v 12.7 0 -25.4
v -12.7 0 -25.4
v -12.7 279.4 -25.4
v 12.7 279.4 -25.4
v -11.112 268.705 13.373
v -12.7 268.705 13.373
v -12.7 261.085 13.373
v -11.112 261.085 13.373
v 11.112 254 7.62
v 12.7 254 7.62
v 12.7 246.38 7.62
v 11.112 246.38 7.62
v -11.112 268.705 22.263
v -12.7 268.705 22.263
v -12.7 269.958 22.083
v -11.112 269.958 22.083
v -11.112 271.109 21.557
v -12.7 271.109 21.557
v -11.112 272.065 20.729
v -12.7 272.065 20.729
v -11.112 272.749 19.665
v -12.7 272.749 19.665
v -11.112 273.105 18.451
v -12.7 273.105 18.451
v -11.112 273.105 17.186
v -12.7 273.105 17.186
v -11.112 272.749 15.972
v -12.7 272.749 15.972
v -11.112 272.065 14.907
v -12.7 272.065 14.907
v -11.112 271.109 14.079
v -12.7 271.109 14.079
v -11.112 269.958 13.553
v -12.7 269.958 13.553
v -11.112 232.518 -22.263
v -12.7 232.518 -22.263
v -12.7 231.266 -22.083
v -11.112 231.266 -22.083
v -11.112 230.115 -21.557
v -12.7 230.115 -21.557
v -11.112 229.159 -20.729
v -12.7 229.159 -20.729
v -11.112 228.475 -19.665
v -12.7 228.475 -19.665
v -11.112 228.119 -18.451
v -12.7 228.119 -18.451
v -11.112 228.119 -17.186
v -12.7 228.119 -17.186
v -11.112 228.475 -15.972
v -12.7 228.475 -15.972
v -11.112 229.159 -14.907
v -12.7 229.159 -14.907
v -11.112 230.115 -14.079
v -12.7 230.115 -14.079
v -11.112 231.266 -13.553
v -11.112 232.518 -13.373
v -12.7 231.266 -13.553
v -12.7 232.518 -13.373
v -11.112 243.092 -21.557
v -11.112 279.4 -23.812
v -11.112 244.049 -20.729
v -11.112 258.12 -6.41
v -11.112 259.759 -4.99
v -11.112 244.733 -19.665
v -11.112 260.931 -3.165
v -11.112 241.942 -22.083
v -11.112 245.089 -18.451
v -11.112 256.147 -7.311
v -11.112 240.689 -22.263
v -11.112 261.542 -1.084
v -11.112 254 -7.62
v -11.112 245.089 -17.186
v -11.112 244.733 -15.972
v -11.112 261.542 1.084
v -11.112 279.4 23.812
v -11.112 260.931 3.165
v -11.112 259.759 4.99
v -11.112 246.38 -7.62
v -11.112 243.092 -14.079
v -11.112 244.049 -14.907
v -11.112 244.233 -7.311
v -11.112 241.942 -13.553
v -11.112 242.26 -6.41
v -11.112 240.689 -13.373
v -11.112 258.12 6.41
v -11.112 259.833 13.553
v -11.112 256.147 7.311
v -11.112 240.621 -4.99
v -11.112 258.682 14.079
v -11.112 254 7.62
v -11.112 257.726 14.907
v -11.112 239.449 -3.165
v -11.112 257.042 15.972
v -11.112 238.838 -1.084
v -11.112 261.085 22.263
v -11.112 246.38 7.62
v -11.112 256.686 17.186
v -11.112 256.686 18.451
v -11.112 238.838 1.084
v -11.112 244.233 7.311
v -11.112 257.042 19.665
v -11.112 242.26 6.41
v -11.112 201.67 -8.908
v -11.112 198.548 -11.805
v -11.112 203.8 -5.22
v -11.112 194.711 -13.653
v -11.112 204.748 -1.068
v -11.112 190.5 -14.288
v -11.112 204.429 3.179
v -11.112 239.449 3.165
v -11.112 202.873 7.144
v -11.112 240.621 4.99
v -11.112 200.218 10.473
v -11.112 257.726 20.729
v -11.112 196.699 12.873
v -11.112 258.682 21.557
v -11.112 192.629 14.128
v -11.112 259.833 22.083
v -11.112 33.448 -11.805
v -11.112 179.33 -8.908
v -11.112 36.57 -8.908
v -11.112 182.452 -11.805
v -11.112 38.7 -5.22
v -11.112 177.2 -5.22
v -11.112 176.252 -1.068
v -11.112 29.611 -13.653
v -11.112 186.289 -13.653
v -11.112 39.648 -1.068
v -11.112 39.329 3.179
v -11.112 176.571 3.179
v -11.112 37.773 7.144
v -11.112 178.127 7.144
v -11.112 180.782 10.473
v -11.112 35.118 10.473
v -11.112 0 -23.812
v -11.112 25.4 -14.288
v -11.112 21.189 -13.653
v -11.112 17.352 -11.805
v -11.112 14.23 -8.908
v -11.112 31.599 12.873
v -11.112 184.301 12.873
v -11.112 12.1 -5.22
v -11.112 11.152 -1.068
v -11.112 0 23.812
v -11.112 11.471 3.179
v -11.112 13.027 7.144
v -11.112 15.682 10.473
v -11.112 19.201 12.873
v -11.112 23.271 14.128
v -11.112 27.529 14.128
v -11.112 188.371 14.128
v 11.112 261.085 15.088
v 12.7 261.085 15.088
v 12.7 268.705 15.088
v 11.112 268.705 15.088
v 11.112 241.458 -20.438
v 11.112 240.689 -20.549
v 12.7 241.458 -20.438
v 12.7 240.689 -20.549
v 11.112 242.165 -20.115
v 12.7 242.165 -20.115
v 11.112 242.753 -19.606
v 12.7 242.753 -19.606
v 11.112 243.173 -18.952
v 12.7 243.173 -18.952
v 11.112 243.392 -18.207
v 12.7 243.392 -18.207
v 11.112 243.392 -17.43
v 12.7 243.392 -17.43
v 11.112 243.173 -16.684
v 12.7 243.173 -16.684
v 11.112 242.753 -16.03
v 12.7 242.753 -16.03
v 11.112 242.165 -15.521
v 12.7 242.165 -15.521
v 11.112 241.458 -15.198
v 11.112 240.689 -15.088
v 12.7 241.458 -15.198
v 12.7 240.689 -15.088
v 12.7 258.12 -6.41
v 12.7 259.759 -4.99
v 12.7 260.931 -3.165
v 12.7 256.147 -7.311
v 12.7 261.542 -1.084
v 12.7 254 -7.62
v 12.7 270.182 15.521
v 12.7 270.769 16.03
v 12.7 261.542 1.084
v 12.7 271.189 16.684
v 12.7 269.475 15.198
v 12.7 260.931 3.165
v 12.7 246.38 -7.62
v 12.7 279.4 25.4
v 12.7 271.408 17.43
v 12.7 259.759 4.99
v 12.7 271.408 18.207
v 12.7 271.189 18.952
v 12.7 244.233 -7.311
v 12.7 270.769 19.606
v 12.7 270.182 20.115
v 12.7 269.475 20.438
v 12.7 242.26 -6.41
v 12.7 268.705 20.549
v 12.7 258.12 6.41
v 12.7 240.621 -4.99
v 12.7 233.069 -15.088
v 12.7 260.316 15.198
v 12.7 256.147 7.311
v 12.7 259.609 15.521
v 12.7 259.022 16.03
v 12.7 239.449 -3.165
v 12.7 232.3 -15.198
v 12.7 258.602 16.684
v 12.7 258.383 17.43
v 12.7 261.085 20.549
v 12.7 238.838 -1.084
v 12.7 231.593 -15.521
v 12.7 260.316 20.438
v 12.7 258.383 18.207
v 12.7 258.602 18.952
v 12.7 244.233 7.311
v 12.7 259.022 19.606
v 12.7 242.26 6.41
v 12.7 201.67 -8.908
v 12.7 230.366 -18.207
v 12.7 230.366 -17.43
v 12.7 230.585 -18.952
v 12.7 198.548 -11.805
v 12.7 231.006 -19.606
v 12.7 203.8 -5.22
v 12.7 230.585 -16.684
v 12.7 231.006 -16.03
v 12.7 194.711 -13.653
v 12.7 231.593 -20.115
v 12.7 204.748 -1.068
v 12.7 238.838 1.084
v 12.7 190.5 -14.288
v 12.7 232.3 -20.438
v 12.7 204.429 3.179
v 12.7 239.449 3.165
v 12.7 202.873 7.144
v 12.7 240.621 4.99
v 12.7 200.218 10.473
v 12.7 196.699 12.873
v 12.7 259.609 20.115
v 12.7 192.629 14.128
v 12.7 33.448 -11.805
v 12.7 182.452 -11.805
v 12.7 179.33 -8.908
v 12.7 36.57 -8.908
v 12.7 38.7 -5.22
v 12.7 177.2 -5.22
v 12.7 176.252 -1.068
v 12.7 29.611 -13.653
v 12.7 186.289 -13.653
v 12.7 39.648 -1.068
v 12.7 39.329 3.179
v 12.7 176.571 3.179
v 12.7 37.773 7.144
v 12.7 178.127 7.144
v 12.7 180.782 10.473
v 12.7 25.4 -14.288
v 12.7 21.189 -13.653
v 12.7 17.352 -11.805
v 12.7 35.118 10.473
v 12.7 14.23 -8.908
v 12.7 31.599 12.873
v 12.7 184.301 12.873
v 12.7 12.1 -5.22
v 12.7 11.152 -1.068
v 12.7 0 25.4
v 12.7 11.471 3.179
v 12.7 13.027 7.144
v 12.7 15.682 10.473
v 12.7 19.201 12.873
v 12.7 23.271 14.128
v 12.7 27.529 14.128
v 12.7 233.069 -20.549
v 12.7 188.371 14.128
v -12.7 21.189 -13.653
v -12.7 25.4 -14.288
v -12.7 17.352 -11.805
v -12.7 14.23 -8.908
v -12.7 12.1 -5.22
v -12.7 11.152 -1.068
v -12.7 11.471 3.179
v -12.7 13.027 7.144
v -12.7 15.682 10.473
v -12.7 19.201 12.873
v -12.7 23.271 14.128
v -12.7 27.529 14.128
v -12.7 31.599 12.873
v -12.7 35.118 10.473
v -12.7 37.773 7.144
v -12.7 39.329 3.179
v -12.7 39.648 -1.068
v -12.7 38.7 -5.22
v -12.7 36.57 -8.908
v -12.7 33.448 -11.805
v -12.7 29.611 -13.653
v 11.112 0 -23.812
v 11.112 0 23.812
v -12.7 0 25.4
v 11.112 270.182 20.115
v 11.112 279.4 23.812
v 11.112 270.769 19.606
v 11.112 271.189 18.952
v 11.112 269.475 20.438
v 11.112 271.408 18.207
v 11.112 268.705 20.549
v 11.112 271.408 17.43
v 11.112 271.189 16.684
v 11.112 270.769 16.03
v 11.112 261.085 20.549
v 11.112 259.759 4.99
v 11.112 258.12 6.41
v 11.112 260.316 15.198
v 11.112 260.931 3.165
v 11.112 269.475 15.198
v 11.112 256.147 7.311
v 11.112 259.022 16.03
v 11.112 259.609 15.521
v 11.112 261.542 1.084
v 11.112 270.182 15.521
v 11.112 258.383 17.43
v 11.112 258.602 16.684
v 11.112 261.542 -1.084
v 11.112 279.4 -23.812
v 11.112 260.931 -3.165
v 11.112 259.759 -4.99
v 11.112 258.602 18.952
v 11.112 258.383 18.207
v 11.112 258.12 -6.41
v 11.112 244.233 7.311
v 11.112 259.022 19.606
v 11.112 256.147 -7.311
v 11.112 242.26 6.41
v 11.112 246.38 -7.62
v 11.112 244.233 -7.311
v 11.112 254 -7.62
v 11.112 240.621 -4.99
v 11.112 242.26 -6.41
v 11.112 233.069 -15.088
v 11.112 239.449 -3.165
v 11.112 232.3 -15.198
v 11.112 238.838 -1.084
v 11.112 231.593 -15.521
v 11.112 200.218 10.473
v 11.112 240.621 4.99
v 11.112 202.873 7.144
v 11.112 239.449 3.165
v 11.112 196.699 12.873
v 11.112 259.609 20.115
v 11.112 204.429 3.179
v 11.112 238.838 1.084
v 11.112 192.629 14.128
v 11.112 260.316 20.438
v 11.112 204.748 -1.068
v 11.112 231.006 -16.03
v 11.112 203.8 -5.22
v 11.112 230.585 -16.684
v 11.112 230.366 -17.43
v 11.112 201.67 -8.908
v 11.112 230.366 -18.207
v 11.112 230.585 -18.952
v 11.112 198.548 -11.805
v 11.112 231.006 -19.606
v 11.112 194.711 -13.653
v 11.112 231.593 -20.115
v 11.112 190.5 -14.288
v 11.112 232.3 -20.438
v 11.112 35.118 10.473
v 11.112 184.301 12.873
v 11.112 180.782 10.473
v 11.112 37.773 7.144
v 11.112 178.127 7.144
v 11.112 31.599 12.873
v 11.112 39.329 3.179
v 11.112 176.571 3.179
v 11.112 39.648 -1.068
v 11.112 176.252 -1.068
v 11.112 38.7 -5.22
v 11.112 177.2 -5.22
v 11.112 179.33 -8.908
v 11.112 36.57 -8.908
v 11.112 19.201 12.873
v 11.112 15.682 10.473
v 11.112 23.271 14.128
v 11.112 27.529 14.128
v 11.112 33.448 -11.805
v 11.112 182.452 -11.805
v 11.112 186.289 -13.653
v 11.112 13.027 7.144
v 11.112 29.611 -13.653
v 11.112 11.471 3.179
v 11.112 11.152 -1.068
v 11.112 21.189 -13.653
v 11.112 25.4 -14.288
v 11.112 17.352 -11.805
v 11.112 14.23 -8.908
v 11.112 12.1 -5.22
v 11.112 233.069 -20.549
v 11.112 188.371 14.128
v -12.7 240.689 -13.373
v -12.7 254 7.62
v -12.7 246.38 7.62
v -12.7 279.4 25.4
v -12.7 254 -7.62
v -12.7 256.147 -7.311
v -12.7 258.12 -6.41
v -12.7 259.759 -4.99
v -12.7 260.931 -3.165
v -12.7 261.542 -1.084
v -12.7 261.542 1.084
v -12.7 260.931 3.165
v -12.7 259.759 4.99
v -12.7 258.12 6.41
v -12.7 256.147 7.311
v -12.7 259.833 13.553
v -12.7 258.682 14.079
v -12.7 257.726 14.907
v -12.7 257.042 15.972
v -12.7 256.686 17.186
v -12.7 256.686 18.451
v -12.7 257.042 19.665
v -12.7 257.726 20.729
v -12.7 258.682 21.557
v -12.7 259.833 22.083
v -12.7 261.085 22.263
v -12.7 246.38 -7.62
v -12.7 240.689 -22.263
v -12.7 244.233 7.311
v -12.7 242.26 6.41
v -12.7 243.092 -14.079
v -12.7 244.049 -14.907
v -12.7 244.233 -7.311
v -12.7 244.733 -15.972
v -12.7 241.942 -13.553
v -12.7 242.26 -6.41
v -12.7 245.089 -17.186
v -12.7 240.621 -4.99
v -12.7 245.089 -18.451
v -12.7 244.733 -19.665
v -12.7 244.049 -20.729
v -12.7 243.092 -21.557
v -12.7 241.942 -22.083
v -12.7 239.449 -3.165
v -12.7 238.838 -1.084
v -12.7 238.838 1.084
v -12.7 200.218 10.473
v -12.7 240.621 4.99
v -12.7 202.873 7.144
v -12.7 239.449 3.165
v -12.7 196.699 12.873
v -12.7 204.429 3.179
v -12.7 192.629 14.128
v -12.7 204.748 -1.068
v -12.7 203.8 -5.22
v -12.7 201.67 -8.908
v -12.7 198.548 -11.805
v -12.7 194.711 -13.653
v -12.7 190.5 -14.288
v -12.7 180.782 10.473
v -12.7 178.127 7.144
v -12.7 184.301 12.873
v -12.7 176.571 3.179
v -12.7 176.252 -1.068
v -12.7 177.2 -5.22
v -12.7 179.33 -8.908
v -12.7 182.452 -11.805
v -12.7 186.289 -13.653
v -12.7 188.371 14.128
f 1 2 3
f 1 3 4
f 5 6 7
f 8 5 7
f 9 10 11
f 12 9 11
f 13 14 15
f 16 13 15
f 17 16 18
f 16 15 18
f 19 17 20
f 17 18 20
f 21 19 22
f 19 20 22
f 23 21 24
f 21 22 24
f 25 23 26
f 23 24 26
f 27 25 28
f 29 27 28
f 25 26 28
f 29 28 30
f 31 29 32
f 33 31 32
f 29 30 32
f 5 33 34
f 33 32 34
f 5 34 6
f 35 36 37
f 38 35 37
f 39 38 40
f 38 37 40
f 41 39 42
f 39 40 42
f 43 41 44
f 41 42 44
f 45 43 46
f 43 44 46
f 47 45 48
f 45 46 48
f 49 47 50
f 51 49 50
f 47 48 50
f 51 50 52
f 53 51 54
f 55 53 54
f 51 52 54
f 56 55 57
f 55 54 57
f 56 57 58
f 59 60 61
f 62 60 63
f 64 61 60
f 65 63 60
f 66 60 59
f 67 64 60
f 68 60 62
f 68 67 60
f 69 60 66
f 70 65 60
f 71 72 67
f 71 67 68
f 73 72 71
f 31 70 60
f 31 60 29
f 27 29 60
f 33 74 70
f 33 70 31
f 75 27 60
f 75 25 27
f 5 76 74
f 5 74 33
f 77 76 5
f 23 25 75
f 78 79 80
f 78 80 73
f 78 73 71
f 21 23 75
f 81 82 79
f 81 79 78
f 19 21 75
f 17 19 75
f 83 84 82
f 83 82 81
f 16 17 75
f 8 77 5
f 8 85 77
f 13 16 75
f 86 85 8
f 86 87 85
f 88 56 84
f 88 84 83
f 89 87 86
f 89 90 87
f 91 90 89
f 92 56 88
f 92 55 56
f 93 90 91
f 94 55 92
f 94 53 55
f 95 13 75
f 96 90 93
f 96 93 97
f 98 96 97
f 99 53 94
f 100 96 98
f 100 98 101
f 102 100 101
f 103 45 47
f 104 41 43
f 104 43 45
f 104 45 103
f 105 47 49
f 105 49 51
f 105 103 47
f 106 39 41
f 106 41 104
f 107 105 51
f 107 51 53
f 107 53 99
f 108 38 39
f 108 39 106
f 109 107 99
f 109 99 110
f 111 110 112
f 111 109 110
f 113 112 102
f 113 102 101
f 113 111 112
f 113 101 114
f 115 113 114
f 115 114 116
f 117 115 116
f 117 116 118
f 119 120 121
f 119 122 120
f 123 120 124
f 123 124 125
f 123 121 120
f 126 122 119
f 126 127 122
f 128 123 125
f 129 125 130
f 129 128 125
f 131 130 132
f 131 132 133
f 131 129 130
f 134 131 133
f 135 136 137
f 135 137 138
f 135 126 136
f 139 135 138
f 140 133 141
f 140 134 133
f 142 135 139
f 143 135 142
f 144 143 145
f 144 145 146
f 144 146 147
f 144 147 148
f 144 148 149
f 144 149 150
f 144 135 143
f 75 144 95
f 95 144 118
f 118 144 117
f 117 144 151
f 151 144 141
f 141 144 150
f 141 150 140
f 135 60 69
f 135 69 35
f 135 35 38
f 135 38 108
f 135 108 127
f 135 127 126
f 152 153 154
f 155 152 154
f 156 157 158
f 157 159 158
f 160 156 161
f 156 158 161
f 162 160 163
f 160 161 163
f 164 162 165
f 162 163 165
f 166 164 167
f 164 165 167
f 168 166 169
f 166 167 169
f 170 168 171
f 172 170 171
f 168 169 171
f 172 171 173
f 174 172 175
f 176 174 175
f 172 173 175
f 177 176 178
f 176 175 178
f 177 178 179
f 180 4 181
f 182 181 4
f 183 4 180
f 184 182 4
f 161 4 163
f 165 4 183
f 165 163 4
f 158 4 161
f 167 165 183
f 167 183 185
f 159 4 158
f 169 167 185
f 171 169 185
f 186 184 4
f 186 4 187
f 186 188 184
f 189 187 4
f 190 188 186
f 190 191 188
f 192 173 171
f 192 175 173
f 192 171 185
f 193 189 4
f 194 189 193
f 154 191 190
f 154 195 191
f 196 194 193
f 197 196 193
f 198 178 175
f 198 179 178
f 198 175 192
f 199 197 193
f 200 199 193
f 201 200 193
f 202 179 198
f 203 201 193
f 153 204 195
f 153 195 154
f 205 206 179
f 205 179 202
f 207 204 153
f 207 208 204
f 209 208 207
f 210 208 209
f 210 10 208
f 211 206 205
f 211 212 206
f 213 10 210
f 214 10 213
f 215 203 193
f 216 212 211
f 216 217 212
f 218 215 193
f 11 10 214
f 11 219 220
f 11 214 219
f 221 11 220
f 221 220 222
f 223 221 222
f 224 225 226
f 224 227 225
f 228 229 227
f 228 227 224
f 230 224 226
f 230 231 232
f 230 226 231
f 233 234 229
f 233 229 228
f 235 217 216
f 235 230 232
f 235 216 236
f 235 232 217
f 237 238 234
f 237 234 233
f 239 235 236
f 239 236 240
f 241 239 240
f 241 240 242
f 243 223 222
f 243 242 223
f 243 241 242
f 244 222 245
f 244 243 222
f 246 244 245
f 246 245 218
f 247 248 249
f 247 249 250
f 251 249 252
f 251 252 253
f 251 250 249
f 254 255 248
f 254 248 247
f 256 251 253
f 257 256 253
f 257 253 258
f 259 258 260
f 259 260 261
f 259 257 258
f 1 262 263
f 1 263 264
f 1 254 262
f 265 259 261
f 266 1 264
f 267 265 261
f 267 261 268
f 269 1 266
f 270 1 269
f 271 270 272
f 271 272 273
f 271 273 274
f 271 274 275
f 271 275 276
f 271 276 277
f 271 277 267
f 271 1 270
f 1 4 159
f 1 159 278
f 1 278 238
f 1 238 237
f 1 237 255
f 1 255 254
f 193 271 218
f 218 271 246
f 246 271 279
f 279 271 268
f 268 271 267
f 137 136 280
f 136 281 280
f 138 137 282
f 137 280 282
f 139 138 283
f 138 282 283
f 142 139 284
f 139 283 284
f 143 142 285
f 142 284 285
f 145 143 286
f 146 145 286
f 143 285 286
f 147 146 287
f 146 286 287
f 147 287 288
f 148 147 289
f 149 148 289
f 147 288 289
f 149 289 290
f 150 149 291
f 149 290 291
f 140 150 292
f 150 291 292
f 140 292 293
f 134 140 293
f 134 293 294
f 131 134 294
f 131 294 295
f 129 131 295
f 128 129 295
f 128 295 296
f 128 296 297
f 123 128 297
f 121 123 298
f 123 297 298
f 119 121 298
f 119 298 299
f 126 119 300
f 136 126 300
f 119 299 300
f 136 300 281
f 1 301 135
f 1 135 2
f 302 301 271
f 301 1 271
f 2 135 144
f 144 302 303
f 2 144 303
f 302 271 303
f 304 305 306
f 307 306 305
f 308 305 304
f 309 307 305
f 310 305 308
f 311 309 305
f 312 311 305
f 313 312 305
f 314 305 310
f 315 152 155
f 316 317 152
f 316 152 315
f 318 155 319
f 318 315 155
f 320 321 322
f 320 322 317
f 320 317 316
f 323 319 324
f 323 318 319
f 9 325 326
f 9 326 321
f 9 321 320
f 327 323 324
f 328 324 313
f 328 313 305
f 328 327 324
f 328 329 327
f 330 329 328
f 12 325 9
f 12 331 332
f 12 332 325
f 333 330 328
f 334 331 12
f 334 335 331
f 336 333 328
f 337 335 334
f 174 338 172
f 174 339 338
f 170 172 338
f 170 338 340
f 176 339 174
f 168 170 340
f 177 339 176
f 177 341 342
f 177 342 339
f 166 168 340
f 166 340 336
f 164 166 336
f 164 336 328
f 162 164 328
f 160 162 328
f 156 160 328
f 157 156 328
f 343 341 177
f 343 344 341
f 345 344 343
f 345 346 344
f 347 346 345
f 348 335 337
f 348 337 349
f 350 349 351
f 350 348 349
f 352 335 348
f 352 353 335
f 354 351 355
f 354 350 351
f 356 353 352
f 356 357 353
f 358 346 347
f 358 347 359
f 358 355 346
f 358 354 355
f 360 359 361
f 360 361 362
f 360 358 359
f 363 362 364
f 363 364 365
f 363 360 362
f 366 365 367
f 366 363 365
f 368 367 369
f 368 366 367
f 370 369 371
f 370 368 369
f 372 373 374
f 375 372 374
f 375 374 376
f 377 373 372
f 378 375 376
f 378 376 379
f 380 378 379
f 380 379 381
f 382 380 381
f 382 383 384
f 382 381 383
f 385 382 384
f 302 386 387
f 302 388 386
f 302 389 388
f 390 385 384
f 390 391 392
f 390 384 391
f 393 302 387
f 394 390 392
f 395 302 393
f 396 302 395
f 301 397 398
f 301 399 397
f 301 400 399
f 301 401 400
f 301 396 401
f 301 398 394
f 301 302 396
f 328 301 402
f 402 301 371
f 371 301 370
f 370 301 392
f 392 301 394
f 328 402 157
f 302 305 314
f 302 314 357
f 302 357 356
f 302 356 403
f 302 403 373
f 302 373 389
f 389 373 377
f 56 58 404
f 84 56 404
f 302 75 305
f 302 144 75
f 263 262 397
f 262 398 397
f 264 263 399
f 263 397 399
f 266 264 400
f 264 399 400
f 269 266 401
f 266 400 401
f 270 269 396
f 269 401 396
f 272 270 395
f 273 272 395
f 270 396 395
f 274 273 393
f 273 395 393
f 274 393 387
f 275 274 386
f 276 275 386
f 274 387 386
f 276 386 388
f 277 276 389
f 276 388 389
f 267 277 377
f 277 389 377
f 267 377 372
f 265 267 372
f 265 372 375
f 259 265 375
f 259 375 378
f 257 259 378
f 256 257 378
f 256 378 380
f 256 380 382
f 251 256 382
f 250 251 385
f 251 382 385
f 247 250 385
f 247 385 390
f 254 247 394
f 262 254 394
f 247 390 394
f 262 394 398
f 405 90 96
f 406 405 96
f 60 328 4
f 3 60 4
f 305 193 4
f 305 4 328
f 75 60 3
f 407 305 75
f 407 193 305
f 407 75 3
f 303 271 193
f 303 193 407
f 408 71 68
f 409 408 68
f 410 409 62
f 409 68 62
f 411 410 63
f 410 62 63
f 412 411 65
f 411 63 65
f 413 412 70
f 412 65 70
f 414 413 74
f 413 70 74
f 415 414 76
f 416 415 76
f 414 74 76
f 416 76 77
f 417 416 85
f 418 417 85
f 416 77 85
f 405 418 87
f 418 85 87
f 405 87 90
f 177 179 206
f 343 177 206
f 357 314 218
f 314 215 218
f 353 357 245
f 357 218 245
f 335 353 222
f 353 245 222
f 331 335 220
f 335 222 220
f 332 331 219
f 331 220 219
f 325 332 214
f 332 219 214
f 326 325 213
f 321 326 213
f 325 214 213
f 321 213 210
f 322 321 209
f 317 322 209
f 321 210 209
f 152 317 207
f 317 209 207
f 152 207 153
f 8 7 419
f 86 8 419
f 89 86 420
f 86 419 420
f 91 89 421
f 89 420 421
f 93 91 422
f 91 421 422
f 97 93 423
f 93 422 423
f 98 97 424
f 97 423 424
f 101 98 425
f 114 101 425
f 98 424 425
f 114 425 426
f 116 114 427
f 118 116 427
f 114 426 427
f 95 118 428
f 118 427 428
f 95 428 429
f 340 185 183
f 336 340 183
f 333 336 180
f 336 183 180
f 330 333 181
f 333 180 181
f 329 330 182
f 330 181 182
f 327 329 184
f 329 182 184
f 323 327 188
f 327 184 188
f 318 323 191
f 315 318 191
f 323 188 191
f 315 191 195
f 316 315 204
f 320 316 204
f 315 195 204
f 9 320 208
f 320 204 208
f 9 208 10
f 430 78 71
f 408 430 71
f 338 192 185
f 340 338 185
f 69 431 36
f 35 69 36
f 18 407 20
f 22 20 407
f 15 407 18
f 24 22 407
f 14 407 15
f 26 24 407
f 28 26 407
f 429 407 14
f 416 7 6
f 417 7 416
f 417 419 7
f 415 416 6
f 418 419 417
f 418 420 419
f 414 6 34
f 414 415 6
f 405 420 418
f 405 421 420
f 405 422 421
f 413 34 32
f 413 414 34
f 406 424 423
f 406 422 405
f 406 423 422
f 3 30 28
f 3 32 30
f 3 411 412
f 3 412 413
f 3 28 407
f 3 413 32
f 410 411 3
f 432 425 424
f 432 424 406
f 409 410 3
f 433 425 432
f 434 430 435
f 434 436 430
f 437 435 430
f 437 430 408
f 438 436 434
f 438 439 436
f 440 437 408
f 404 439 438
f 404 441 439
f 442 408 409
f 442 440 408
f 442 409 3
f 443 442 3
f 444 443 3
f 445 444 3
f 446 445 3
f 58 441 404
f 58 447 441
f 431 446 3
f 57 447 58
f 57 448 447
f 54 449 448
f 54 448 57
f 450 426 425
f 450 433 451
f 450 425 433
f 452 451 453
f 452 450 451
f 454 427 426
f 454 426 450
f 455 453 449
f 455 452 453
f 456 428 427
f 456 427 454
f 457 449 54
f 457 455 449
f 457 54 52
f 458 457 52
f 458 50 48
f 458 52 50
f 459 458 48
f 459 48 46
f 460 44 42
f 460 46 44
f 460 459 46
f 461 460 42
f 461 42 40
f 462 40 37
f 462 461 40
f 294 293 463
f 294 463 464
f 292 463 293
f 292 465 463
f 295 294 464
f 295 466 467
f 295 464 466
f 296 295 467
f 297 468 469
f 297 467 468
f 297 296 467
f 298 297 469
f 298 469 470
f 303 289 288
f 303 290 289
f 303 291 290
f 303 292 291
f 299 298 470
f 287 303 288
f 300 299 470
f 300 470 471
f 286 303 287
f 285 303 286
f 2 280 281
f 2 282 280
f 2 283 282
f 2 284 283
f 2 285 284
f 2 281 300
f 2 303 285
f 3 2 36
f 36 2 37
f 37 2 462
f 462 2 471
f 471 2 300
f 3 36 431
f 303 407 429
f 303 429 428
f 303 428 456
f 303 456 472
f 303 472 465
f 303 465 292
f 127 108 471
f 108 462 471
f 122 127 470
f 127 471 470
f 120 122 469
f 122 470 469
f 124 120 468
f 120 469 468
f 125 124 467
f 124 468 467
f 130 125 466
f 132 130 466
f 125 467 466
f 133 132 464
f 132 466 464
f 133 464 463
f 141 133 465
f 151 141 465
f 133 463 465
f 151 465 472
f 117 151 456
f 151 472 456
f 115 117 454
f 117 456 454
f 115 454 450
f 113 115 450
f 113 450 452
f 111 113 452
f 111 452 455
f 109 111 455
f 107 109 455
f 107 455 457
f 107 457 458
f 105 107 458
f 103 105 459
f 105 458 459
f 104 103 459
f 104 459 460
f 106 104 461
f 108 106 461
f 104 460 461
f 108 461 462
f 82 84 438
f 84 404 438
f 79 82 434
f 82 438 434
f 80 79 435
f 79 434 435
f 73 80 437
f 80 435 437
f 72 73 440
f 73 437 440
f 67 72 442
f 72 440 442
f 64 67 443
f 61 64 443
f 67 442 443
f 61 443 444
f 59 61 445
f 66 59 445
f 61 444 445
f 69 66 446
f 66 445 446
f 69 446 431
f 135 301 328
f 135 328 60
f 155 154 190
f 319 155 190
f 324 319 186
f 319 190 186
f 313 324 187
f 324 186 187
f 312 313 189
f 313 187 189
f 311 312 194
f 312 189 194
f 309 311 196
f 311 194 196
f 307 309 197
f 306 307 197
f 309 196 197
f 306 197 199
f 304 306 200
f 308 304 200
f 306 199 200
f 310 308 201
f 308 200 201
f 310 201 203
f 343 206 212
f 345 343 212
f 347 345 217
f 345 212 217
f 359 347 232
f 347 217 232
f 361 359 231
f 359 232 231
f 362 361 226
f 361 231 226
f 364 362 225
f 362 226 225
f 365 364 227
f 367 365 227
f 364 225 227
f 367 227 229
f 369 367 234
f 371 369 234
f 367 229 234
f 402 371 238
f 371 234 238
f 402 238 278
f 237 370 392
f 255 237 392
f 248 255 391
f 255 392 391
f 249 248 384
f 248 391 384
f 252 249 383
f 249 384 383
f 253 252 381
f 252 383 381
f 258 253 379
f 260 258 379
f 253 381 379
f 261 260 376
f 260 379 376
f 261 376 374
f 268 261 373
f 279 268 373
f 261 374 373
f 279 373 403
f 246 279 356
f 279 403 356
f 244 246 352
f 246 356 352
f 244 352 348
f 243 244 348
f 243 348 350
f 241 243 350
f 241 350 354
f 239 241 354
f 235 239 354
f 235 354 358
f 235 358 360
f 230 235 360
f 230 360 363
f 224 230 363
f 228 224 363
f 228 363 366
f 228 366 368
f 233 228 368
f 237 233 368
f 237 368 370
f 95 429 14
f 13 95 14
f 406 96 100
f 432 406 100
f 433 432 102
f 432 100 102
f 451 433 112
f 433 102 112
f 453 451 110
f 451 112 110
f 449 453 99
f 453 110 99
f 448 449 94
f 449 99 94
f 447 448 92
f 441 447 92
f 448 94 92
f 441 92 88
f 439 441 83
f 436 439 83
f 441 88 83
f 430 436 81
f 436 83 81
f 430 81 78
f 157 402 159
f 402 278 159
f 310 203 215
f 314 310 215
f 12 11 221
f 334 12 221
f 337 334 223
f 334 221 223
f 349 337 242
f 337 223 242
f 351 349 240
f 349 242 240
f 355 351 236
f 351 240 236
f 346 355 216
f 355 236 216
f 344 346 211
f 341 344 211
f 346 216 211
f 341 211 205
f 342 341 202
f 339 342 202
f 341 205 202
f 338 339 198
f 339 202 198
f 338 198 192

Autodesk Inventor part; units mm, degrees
ref_plane "YZ Plane" through (0, 0, 0) normal (1, 0, 0) x (0, 1, 0)
ref_plane "XZ Plane" through (0, 0, 0) normal (0, 1, 0) x (-1, 0, 0)
ref_plane "XY Plane" through (0, 0, 0) normal (0, 0, 1) x (1, 0, 0)
sketch "Sketch1" plane through (0, 0, 0) normal (0, 1, 0) x (-1, 0, 0)
  line L0 (-12.7, 25.4) -> (12.7, 25.4)
  line L1 (12.7, 25.4) -> (12.7, -25.4)
  line L2 (12.7, -25.4) -> (-12.7, -25.4)
  line L3 (-12.7, -25.4) -> (-12.7, 25.4)
  line L4 (-12.7, 25.4) -> (12.7, -25.4) construction
  line L5 (12.7, 25.4) -> (-12.7, -25.4) construction
  line L6 (11.1125, 23.8125) -> (-11.1125, 23.8125)
  line L7 (-11.1125, 23.8125) -> (-11.1125, -23.8125)
  line L8 (-11.1125, -23.8125) -> (11.1125, -23.8125)
  line L9 (11.1125, -23.8125) -> (11.1125, 23.8125)
  line L10 (11.1125, 23.8125) -> (-11.1125, -23.8125) construction
  line L11 (-11.1125, 23.8125) -> (11.1125, -23.8125) construction
  point P0 (0, 0)
  dimension "d0" = 25.4
  dimension "d1" = 50.8
  dimension "d2" = 22.225
  dimension "d3" = 47.625
extrude "Extrusion1" add sketch "Sketch1" along normal blind 279.4
sketch "Sketch2" plane through (12.7, 0, 25.4) normal (1, 0, 0) x (0, 0, -1)
  line L0 (0, 279.4) -> (50.8, 279.4) projected
  line L1 (0, 0) -> (0, 279.4) projected
  point P0 (25.4, 0)
  point P1 (25.4, 190.5)
  dimension "d21" = 25.4
  dimension "d24" = 190.5
hole "Hole1" at (12.7, 190.5, 0) direction (-1, 0, 0) diameter 28.575 end through all
sketch "Sketch3" plane through (12.7, 0, 25.4) normal (1, 0, 0) x (0, 0, -1)
  line L0 (50.8, 0) -> (50.8, 279.4) projected
  line L1 (0, 0) -> (50.8, 0) projected
  point P0 (25.4, 0)
  point P1 (25.4, 25.4)
  dimension "d22" = 25.4
  dimension "d23" = 25.4
hole "Hole2" at (12.7, 25.4, 0) direction (-1, 0, 0) diameter 28.575 end through all
sketch "Sketch5" plane through (12.7, 0, 25.4) normal (1, 0, 0) x (0, 0, -1)
  line L0 (25.4, 254) -> (25.4, 246.38) construction
  line L1 (17.78, 254) -> (17.78, 246.38)
  line L2 (33.02, 246.38) -> (33.02, 254)
  arc A0 (33.02, 254) -> (17.78, 254) centre (25.4, 254) ccw
  arc A1 (17.78, 246.38) -> (33.02, 246.38) centre (25.4, 246.38) ccw
  line L3 (0, 279.4) -> (50.8, 279.4) projected
  point P0 (25.4, 0)
  point P1 (25.4, 250.19)
  dimension "d34" = 7.62
  dimension "d35" = 15.24
  dimension "d36" = 25.4
extrude "Extrusion2" cut sketch "Sketch5" against normal through all
sketch "Sketch6" plane through (12.7, 0, 25.4) normal (1, 0, 0) x (0, 0, -1)
  line L0 (7.5819, 268.7054) -> (43.2181, 268.7054) construction
  line L1 (43.2181, 268.7054) -> (43.2181, 233.0692) construction
  line L2 (43.2181, 233.0692) -> (7.5819, 233.0692) construction
  line L3 (7.5819, 233.0692) -> (7.5819, 268.7054) construction
  line L4 (7.5819, 268.7054) -> (43.2181, 233.0692) construction
  line L5 (43.2181, 268.7054) -> (7.5819, 233.0692) construction
  line L6 (7.5819, 268.7054) -> (7.5819, 261.0854) construction
  line L7 (4.8514, 268.7054) -> (4.8514, 261.0854)
  line L8 (10.3124, 261.0854) -> (10.3124, 268.7054)
  arc A0 (10.3124, 268.7054) -> (4.8514, 268.7054) centre (7.5819, 268.7054) ccw
  arc A1 (4.8514, 261.0854) -> (10.3124, 261.0854) centre (7.5819, 261.0854) ccw
  line L9 (43.2181, 233.0692) -> (43.2181, 240.6892) construction
  line L10 (45.9486, 233.0692) -> (45.9486, 240.6892)
  line L11 (40.4876, 240.6892) -> (40.4876, 233.0692)
  arc A2 (40.4876, 233.0692) -> (45.9486, 233.0692) centre (43.2181, 233.0692) ccw
  arc A3 (45.9486, 240.6892) -> (40.4876, 240.6892) centre (43.2181, 240.6892) ccw
  point P0 (25.4, 0)
  point P1 (25.4, 250.8873)
  point P2 (7.5819, 264.8954)
  point P3 (43.2181, 236.8792)
  dimension "d39" = 35.6362
  dimension "d40" = 35.6362
  dimension "d46" = 7.62
  dimension "d47" = 5.461
  dimension "d48" = 7.62
  dimension "d49" = 5.461
extrude "Extrusion3" cut sketch "Sketch6" against normal through all
sketch "Sketch7" plane through (-12.7, 0, -25.4) normal (-1, 0, 0) x (0, 0, 1)
  arc A0 (10.3124, 240.6892) -> (4.8514, 240.6892) centre (7.5819, 240.6892) ccw projected
  line L0 (7.5819, 240.6892) -> (7.5819, 232.5183) construction
  line L1 (3.1369, 240.6892) -> (3.1369, 232.5183)
  line L2 (12.0269, 232.5183) -> (12.0269, 240.6892)
  arc A1 (12.0269, 240.6892) -> (3.1369, 240.6892) centre (7.5819, 240.6892) ccw
  arc A2 (3.1369, 232.5183) -> (12.0269, 232.5183) centre (7.5819, 232.5183) ccw
  arc A3 (45.9486, 268.7054) -> (40.4876, 268.7054) centre (43.2181, 268.7054) ccw projected
  arc A4 (40.4876, 261.0854) -> (45.9486, 261.0854) centre (43.2181, 261.0854) ccw projected
  line L3 (43.2181, 268.7054) -> (43.2181, 261.0854) construction
  line L4 (38.7731, 268.7054) -> (38.7731, 261.0854)
  line L5 (47.6631, 261.0854) -> (47.6631, 268.7054)
  arc A5 (47.6631, 268.7054) -> (38.7731, 268.7054) centre (43.2181, 268.7054) ccw
  arc A6 (38.7731, 261.0854) -> (47.6631, 261.0854) centre (43.2181, 261.0854) ccw
  point P0 (25.4, 0)
  point P1 (7.5819, 236.6038)
  point P2 (43.2181, 264.8954)
  dimension "d50" = 8.89
  dimension "d51" = 8.89
extrude "Extrusion4" cut sketch "Sketch7" against normal blind 12.7
properties part number "2x1 Front with motor mount" material "Aluminum 6061"
